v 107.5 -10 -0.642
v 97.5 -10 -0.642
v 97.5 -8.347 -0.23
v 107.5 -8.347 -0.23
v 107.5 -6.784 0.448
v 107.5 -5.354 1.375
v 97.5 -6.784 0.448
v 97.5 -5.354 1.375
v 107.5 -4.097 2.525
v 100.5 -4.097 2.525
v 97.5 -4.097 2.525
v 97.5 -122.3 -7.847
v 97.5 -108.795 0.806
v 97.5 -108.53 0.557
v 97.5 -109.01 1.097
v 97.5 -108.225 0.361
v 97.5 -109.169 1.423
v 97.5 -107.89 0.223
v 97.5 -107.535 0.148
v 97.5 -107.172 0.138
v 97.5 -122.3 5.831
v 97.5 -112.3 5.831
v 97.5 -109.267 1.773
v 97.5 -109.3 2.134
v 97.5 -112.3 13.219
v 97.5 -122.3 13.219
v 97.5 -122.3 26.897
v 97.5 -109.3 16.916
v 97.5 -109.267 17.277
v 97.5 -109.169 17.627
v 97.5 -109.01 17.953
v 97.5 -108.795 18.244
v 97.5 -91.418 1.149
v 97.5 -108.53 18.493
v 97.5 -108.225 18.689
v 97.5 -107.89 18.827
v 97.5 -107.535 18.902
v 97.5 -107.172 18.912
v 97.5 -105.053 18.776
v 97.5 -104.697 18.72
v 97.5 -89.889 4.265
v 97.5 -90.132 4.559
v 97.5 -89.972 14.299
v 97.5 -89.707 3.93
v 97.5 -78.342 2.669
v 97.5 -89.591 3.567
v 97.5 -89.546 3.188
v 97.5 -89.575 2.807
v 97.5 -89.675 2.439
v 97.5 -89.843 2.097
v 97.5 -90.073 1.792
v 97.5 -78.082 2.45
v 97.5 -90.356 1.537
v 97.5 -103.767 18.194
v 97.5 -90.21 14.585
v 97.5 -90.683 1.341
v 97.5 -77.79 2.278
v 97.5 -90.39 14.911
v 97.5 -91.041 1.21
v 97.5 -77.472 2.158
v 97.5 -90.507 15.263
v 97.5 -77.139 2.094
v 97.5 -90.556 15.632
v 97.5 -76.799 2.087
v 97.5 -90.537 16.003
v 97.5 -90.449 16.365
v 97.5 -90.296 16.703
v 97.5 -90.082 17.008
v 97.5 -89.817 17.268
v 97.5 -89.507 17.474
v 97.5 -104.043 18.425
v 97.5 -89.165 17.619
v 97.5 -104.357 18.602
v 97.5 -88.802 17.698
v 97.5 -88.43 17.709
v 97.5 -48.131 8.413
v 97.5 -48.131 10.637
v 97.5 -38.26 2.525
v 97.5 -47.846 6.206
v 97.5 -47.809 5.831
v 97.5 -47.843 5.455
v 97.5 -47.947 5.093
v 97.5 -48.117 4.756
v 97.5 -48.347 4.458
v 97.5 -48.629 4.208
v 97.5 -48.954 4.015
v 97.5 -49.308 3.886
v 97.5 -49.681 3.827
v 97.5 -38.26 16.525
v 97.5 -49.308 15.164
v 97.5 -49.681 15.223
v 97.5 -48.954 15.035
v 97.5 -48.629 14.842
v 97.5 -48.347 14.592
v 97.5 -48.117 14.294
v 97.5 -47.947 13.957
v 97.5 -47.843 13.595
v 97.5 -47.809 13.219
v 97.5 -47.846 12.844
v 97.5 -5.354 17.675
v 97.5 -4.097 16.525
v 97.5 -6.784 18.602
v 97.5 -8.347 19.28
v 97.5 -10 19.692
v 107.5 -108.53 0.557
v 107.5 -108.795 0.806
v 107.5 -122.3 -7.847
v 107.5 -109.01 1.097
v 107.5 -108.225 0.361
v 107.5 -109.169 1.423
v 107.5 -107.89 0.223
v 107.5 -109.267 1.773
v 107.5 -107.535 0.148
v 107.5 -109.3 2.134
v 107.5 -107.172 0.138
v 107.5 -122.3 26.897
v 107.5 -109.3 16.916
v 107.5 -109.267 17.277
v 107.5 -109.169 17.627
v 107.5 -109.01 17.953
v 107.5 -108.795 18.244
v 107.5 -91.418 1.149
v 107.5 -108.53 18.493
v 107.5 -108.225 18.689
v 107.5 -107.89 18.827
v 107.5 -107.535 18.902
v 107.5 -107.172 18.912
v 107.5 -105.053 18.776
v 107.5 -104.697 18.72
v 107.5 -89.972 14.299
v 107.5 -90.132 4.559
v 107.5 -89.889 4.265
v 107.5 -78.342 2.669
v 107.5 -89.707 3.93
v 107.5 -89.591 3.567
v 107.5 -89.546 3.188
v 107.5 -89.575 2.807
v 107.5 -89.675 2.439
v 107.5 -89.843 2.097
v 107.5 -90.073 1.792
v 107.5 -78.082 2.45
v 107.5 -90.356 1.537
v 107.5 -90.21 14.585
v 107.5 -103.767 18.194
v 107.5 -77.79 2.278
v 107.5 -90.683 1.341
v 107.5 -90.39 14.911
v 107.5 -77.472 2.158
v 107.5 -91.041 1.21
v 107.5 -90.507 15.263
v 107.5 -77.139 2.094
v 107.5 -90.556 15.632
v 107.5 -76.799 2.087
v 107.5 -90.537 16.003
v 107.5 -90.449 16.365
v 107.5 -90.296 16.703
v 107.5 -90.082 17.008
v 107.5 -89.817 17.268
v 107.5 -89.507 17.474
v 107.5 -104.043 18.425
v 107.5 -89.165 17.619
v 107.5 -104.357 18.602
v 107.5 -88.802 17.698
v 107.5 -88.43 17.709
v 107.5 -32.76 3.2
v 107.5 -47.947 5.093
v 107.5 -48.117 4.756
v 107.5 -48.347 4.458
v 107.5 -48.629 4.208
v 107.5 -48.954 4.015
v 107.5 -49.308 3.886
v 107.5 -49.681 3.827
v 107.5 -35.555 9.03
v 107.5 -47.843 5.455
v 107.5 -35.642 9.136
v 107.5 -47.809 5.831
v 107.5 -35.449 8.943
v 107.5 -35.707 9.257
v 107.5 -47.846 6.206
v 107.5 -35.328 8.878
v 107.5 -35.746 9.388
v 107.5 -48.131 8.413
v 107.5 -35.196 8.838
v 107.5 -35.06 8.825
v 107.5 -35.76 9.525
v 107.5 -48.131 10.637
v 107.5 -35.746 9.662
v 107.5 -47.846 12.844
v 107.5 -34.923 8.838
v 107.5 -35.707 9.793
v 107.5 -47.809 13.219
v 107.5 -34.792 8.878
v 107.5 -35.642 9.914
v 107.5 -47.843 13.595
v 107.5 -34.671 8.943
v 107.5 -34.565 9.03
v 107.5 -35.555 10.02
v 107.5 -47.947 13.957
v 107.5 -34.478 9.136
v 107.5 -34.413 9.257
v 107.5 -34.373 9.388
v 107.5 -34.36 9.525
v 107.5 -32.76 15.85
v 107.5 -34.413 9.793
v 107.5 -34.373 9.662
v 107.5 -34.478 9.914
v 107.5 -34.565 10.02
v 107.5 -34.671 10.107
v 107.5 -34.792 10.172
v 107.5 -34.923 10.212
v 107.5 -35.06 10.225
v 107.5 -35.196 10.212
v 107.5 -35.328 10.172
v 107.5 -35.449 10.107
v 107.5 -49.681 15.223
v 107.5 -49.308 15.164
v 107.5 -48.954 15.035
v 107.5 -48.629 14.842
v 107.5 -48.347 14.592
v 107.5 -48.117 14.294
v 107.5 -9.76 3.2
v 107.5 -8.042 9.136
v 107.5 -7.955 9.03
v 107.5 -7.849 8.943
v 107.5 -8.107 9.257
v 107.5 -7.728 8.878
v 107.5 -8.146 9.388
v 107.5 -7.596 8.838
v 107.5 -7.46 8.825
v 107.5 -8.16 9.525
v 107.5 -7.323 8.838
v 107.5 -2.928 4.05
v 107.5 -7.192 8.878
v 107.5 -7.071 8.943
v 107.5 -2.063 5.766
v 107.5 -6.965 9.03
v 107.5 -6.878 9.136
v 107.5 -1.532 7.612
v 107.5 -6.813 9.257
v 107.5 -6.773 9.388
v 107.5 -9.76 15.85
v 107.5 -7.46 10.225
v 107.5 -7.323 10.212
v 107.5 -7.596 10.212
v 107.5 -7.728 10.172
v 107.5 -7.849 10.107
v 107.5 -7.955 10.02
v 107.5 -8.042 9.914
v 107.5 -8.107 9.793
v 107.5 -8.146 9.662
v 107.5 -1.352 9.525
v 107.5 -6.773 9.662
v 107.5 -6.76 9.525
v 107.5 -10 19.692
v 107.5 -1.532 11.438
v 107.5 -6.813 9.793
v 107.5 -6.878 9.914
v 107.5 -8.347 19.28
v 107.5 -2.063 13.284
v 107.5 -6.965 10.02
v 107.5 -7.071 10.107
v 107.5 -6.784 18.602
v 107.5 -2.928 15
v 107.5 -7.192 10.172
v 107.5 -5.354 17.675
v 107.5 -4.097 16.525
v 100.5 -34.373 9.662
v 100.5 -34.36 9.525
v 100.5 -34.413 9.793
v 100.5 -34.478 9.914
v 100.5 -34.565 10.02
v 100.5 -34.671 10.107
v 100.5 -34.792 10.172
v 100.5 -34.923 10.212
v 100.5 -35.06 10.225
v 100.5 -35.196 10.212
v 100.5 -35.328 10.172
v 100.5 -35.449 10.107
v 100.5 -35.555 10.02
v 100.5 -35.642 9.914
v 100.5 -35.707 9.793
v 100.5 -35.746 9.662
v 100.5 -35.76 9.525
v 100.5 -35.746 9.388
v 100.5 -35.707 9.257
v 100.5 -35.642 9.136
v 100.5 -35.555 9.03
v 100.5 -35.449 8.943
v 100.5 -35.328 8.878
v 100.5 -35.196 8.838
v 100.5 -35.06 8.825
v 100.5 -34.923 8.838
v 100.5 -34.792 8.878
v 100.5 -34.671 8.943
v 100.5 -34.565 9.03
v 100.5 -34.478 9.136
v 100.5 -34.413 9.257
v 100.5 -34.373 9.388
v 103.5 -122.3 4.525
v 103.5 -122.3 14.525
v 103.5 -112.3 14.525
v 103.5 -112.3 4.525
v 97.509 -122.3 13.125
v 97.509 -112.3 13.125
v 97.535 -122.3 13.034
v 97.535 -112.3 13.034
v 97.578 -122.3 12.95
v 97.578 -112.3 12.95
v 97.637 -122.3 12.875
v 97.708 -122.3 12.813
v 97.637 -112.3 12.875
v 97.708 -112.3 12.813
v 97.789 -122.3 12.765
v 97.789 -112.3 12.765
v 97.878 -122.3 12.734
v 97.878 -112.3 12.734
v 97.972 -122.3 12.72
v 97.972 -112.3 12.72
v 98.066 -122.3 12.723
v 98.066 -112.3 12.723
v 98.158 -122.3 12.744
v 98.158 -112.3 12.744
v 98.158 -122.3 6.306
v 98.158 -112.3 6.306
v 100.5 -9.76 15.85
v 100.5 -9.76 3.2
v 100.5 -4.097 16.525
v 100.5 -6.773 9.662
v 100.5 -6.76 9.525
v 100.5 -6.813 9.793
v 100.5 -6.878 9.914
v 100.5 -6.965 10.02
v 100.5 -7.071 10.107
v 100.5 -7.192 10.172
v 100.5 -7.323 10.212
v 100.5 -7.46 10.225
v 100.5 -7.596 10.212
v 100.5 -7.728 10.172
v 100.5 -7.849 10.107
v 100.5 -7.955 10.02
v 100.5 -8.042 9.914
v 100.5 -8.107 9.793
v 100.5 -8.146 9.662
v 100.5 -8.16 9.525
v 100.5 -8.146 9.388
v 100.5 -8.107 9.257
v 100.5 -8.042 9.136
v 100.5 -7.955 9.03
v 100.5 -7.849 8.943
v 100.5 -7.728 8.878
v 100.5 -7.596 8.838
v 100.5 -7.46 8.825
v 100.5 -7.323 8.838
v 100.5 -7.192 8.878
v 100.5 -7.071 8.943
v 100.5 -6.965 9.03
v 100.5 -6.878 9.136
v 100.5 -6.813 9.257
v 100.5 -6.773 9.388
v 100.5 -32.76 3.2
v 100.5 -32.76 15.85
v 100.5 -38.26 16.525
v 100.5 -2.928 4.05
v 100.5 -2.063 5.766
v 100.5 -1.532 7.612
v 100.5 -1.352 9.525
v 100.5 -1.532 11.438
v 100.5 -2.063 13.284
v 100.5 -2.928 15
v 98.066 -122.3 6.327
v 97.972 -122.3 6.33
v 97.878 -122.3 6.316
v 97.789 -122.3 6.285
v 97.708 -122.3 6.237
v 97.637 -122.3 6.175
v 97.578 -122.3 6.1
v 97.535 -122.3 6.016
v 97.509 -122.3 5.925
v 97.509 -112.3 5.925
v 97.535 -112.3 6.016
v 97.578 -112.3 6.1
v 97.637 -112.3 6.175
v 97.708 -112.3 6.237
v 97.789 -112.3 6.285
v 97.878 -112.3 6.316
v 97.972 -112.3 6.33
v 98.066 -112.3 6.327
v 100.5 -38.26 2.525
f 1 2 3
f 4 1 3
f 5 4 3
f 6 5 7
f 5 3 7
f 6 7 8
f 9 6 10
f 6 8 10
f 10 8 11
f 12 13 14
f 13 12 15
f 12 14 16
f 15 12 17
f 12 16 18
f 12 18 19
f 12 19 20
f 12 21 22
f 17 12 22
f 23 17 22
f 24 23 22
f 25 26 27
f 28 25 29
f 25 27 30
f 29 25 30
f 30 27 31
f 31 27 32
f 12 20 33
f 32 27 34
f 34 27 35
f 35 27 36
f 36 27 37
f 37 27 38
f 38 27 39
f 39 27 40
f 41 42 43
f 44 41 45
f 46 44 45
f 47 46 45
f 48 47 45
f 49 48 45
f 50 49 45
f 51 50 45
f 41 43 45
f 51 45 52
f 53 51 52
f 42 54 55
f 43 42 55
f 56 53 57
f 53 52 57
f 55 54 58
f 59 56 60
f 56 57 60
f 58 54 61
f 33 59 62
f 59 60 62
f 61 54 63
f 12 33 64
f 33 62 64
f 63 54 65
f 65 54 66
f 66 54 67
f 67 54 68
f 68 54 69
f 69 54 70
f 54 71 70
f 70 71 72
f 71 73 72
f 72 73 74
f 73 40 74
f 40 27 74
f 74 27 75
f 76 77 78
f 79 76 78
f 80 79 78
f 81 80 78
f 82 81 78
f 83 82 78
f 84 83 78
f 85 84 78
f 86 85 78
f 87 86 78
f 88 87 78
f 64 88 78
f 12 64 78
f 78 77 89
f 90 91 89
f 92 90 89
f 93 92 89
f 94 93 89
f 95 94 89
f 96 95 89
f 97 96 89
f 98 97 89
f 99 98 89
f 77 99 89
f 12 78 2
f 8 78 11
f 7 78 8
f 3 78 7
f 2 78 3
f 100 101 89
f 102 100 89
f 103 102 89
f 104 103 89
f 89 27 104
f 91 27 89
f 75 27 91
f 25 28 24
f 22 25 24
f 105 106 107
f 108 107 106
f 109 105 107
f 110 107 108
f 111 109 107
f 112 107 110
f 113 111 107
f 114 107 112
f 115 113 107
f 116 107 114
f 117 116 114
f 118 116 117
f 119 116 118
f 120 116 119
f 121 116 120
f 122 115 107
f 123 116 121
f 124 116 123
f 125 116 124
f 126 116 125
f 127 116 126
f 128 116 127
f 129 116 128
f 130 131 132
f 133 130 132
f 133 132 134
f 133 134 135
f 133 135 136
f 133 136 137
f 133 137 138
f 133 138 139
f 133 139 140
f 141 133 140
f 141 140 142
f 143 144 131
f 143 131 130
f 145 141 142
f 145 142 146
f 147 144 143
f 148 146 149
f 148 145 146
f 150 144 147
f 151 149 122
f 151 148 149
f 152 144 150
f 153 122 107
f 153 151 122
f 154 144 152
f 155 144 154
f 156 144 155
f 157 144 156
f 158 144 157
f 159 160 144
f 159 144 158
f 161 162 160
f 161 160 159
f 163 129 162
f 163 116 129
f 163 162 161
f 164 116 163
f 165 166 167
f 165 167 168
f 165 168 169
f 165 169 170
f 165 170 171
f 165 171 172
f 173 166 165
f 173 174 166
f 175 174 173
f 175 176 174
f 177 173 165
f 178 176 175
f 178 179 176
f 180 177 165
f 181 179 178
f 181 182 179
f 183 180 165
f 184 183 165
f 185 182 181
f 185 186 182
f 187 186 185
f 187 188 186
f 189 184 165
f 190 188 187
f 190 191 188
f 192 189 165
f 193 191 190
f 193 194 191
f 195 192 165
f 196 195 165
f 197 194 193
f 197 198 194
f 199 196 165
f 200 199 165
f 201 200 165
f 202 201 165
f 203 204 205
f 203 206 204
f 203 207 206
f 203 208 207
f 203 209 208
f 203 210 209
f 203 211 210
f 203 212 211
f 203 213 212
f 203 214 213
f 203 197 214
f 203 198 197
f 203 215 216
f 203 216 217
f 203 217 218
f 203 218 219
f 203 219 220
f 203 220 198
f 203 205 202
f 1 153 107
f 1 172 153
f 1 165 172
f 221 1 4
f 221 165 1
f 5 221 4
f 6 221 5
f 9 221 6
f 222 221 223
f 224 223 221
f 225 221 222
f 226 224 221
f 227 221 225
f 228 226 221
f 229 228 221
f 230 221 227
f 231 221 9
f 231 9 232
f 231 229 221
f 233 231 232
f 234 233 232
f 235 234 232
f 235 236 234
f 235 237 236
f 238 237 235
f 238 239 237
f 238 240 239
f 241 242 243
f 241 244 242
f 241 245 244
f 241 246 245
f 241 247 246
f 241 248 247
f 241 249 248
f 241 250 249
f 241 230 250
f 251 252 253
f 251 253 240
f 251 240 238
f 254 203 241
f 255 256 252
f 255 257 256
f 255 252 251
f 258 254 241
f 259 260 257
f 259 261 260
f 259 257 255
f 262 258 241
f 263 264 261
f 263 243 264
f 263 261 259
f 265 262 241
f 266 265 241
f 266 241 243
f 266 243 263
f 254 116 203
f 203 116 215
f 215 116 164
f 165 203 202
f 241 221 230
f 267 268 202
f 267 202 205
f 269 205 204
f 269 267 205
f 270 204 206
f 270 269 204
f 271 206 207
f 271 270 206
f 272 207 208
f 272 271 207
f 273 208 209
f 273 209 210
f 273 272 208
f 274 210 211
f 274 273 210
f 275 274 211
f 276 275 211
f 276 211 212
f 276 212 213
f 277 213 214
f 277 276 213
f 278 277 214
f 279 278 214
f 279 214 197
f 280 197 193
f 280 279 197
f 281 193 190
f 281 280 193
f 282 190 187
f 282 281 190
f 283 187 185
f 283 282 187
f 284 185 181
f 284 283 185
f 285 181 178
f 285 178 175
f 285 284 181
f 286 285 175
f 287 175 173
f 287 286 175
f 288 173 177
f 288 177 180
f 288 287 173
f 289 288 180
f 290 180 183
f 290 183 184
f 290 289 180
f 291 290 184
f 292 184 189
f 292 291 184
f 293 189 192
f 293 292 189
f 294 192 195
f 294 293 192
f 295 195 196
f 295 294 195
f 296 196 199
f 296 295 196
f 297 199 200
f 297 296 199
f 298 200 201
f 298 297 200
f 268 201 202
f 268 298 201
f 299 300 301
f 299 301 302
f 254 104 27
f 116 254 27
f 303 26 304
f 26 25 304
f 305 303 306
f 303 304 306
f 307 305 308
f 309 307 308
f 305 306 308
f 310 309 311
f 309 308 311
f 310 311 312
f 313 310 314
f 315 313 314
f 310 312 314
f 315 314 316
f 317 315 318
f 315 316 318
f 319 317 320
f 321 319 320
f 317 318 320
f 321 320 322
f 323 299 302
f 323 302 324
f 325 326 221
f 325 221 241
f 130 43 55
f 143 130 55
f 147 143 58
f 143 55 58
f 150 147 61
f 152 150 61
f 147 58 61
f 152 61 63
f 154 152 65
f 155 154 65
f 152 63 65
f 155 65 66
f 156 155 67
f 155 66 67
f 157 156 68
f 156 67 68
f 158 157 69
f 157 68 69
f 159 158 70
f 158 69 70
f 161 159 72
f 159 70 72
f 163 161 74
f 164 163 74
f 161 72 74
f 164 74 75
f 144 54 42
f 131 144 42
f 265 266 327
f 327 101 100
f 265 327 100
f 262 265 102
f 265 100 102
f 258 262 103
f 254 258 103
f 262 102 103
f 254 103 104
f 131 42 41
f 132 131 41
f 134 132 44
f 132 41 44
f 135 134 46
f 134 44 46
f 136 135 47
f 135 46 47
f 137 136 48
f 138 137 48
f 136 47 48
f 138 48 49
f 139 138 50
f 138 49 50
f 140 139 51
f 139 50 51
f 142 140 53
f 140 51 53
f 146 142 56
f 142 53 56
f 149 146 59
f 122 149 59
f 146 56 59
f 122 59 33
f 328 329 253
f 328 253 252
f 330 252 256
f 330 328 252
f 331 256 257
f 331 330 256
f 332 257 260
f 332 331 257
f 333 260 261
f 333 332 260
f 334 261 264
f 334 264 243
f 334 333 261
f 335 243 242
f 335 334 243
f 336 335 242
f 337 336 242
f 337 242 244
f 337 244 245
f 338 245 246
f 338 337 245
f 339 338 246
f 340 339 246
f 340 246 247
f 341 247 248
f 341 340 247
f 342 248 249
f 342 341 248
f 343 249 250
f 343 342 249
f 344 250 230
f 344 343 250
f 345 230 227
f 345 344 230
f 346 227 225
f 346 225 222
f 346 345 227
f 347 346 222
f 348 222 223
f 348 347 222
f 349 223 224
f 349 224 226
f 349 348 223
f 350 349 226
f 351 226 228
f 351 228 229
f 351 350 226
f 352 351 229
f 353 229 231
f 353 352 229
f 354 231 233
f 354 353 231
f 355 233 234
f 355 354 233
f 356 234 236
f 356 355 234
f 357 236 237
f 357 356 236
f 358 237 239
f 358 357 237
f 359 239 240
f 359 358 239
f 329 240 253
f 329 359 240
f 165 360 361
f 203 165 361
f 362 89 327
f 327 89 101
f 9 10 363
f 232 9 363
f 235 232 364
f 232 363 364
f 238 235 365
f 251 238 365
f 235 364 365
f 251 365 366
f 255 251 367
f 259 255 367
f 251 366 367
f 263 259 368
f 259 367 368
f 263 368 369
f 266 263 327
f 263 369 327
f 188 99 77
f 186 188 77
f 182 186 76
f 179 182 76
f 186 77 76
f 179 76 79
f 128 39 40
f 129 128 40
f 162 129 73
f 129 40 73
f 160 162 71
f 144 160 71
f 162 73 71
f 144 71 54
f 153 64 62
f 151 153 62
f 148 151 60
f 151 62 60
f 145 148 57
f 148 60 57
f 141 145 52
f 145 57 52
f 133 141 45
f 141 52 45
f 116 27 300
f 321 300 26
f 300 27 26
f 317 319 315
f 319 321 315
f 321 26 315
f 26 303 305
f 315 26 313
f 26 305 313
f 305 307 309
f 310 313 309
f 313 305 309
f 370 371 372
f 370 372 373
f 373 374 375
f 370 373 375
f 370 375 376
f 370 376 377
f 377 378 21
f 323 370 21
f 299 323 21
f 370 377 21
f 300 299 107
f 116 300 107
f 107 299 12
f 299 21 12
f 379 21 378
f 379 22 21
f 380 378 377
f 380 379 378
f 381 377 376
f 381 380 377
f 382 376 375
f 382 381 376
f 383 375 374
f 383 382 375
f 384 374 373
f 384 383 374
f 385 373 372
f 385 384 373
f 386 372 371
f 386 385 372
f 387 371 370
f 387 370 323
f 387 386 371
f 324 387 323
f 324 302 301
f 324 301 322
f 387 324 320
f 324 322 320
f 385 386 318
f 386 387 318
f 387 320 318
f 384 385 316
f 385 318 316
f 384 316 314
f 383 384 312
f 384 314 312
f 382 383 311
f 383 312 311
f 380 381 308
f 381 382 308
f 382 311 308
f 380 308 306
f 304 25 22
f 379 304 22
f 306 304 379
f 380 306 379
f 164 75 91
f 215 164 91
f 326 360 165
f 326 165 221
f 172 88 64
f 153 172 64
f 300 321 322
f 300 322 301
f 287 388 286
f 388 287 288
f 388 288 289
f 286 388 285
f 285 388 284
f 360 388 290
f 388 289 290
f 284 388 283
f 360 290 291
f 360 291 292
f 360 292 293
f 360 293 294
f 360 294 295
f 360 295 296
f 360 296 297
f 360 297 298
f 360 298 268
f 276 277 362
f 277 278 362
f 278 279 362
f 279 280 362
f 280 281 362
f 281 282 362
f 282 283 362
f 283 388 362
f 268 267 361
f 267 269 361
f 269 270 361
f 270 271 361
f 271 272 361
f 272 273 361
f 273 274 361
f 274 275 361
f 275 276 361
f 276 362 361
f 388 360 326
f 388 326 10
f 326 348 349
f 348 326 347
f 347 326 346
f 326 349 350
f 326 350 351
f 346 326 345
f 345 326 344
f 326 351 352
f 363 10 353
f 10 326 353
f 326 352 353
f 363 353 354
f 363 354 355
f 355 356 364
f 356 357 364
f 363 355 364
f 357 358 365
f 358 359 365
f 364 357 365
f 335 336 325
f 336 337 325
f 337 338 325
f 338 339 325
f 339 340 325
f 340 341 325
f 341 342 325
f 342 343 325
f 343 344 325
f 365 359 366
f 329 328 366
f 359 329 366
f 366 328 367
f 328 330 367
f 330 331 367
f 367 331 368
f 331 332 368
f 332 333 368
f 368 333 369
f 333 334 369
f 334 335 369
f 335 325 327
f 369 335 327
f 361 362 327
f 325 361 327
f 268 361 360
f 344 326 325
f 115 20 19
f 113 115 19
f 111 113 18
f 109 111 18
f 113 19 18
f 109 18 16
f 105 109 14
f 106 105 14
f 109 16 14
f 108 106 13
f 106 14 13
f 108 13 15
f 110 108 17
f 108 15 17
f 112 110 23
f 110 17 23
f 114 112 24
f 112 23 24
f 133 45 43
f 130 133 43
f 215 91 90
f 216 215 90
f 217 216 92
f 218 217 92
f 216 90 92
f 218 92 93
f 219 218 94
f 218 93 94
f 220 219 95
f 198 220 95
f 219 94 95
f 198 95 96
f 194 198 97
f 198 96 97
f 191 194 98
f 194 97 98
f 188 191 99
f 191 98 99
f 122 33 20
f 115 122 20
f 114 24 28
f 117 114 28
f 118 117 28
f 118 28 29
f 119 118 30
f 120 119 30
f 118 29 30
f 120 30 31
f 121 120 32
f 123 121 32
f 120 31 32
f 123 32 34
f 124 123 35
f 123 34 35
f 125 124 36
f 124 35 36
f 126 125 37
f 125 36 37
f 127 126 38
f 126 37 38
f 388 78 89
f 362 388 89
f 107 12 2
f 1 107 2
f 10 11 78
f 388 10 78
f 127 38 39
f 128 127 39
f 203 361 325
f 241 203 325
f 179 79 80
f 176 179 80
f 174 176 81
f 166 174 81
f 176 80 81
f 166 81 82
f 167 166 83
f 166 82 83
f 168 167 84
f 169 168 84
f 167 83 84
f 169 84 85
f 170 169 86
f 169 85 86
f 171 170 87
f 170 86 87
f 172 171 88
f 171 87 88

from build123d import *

# Parameters (mm, degrees)
STOCK_FRAME_1_START       = 97.5
STOCK_FRAME_1_DEPTH       = 10
STOCK_FRAME_1_START_2     = 100.5
STOCK_FRAME_1_2_OUTLINE_R = 0.7
STOCK_FRAME_1_2_OUTLINE_W = 23
STOCK_FRAME_1_2_OUTLINE_H = 12.65
STOCK_FRAME_1_2_DEPTH     = 7
CUT_EXTRUDE1_DEPTH        = 128.596397383
CUT_EXTRUDE1_DEPTH_BACK   = 128.596397383
SKETCH1_W                 = 49.919710218
SKETCH1_H                 = 2
CUT_EXTRUDE2_DEPTH        = 10
FILLET1_R                 = 0.5


# Read off the part's stored shape, not the designer's step: Stock-frame-1
with BuildPart() as part:
    # Stock-frame-1 outline → Stock-frame-1 (new body)
    with BuildSketch(Plane.YZ.offset(STOCK_FRAME_1_START)):
        with BuildLine():
            Line((-4.096596213, 2.525), (-38.259818101, 2.525))
            Line((-38.259818101, 2.525), (-38.259818101, 16.525))
            Line((-38.259818101, 16.525), (-4.096596213, 16.525))
            ThreePointArc((-4.096596213, 16.525), (-6.783664239, 18.601647078), (-10, 19.69159292))
            Line((-10, 19.69159292), (-124.3, 27.025))
            Line((-124.3, 27.025), (-124.3, -7.975))
            Line((-124.3, -7.975), (-10, -0.64159292))
            ThreePointArc((-10, -0.64159292), (-6.783664239, 0.448352922), (-4.096596213, 2.525))
        make_face()
        with BuildLine():
            ThreePointArc((-109.3, 16.915787193), (-108.668190305, 18.374572746), (-107.17194471, 18.911683443))
            Line((-107.17194471, 18.911683443), (-105.052772964, 18.775718884))
            ThreePointArc((-105.052772964, 18.775718884), (-104.356669901, 18.602118716), (-103.766614692, 18.194036196))
            Line((-103.766614692, 18.194036196), (-90.131771322, 4.559192826))
            ThreePointArc((-90.131771322, 4.559192826), (-89.674659008, 2.439189307), (-91.417929594, 1.149083013))
            Line((-91.417929594, 1.149083013), (-107.17194471, 0.138316557))
            ThreePointArc((-107.17194471, 0.138316557), (-108.668190305, 0.675427254), (-109.3, 2.134212807))
            Line((-109.3, 2.134212807), (-109.3, 16.915787193))
        make_face(mode=Mode.SUBTRACT)
        with BuildLine():
            ThreePointArc((-49.680780162, 15.223091028), (-48.224999236, 14.448449394), (-47.845976598, 12.84354765))
            ThreePointArc((-47.845976598, 12.84354765), (-48.167247509, 9.525), (-47.845976598, 6.20645235))
            ThreePointArc((-47.845976598, 6.20645235), (-48.224999236, 4.601550606), (-49.680780162, 3.826908972))
            Line((-49.680780162, 3.826908972), (-76.799489195, 2.0869918))
            ThreePointArc((-76.799489195, 2.0869918), (-77.633334442, 2.211562173), (-78.341758047, 2.668674488))
            Line((-78.341758047, 2.668674488), (-89.972181694, 14.299098134))
            ThreePointArc((-89.972181694, 14.299098134), (-90.380264213, 16.53747005), (-88.429912841, 17.709207947))
            Line((-88.429912841, 17.709207947), (-49.680780162, 15.223091028))
        make_face(mode=Mode.SUBTRACT)
    extrude(amount=STOCK_FRAME_1_DEPTH)

    # Stock-frame-1 2 outline → Stock-frame-1 2 (add)
    with BuildSketch(Plane.YZ.offset(STOCK_FRAME_1_START_2)):
        with BuildLine():
            Line((-38.259818101, 16.525), (-38.259818101, 2.525))
            Line((-38.259818101, 2.525), (-4.096596213, 2.525))
            ThreePointArc((-4.096596213, 2.525), (-1.352388693, 9.525), (-4.096596213, 16.525))
            Line((-4.096596213, 16.525), (-38.259818101, 16.525))
        make_face()
        with Locations((-35.059818101, 9.525)):
            Circle(STOCK_FRAME_1_2_OUTLINE_R, mode=Mode.SUBTRACT)
        with Locations((-21.259818101, 9.525)):
            Rectangle(STOCK_FRAME_1_2_OUTLINE_W, STOCK_FRAME_1_2_OUTLINE_H, mode=Mode.SUBTRACT)
        with Locations((-7.459818101, 9.525)):
            Circle(STOCK_FRAME_1_2_OUTLINE_R, mode=Mode.SUBTRACT)
    extrude(amount=STOCK_FRAME_1_2_DEPTH)

    # Sketch1 → Cut-Extrude1 (cut, two sides: drawn at the far end of the back side and taken through both)
    with BuildSketch(Plane(origin=(107.5, 0, 0), x_dir=(0, 0, -1), z_dir=(1, 0, 0)).offset(-CUT_EXTRUDE1_DEPTH_BACK)):
        with Locations((-2.065144891, -123.3)):
            Rectangle(SKETCH1_W, SKETCH1_H)
    extrude(amount=CUT_EXTRUDE1_DEPTH + CUT_EXTRUDE1_DEPTH_BACK, mode=Mode.SUBTRACT)

    # Sketch2 → Cut-Extrude2 (cut)
    with BuildSketch(Plane.XZ.offset(122.3)):
        Polygon((97.5, 12.525), (103.5, 14.525), (103.5, 4.525), (97.5, 6.525), align=None)
    extrude(amount=-CUT_EXTRUDE2_DEPTH, mode=Mode.SUBTRACT)

    # Fillet1
    fillet1_edges = [part.edges().sort_by_distance(p)[0] for p in [
        (97.5, -117.3, 6.525),
        (97.5, -117.3, 12.525),
    ]]
    fillet(fillet1_edges, radius=FILLET1_R)


solid = part.part
